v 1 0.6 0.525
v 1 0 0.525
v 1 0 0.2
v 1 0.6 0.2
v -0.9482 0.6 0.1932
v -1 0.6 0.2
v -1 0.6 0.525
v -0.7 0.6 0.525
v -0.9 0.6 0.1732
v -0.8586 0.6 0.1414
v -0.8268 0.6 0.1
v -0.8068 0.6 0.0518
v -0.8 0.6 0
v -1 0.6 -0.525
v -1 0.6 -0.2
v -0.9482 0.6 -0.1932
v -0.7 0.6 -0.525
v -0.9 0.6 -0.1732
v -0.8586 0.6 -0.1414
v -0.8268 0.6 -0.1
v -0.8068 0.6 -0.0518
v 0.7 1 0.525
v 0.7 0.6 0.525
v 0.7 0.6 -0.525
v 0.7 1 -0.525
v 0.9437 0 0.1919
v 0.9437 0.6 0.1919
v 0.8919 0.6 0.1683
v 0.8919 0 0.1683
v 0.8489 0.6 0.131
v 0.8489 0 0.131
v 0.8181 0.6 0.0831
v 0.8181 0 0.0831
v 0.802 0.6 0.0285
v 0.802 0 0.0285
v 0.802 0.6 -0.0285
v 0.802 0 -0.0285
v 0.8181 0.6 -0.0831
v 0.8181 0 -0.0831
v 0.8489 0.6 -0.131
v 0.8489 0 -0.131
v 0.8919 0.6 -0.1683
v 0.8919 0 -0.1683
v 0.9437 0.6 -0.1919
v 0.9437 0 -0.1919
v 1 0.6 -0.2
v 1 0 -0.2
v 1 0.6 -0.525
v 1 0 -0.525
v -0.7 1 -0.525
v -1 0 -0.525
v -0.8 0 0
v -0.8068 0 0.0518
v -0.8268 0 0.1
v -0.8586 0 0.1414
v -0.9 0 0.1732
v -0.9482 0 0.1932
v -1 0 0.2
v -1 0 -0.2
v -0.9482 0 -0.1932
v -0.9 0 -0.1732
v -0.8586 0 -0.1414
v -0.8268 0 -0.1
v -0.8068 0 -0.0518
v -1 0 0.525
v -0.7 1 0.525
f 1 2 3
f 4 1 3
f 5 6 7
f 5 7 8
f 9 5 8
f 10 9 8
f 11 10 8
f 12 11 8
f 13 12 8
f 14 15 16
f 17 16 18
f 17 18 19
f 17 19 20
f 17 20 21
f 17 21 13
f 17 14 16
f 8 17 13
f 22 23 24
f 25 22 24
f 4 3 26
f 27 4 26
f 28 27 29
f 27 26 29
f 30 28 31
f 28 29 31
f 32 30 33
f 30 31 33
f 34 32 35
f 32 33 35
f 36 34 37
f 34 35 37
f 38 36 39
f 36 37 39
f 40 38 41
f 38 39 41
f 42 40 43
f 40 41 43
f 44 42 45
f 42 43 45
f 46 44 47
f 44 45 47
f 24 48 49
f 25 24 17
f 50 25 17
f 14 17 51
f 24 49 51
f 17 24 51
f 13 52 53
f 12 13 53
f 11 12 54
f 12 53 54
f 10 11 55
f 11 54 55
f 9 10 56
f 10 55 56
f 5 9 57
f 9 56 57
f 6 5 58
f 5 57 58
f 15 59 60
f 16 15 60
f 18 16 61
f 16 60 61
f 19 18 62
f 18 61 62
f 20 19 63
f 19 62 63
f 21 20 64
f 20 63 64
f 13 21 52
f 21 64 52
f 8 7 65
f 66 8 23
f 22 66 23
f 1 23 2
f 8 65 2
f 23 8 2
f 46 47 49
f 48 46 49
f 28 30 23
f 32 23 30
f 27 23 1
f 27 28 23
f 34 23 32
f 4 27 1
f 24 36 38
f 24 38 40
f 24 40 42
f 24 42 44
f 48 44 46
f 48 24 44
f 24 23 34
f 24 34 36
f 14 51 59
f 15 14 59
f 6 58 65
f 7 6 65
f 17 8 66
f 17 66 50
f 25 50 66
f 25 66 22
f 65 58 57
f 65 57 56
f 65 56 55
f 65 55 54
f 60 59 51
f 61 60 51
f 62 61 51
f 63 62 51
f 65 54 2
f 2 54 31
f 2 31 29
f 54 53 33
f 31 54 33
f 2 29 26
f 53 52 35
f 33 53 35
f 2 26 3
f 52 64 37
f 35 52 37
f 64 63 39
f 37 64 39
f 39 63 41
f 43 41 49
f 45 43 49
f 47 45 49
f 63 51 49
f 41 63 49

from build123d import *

# Parameters (mm, degrees)
BOSS_EXTRUDE1_DEPTH = 0.6
SKETCH4_W           = 1.4
SKETCH4_H           = 1.05
BOSS_EXTRUDE3_DEPTH = 0.4


with BuildPart() as part:
    # Sketch1 → Boss-Extrude1 (new body)
    with BuildSketch(Plane(origin=(0, 0, 0), x_dir=(1, 0, 0), z_dir=(0, 1, 0))):
        with BuildLine():
            Line((-1, -0.2), (-1, -0.525))
            Line((-1, -0.525), (1, -0.525))
            Line((1, -0.525), (1, -0.2))
            ThreePointArc((1, -0.2), (0.8, 0), (1, 0.2))
            Line((1, 0.2), (1, 0.525))
            Line((1, 0.525), (-1, 0.525))
            Line((-1, 0.525), (-1, 0.2))
            ThreePointArc((-1, 0.2), (-0.858578644, 0.141421356), (-0.8, 0))
            ThreePointArc((-0.8, 0), (-0.858578644, -0.141421356), (-1, -0.2))
        make_face()
    extrude(amount=BOSS_EXTRUDE1_DEPTH)

    # Sketch4 → Boss-Extrude3 (add)
    with BuildSketch(Plane(origin=(0, 0.6, 0), x_dir=(1, 0, 0), z_dir=(0, 1, 0))):
        Rectangle(SKETCH4_W, SKETCH4_H)
    extrude(amount=BOSS_EXTRUDE3_DEPTH)


solid = part.part
